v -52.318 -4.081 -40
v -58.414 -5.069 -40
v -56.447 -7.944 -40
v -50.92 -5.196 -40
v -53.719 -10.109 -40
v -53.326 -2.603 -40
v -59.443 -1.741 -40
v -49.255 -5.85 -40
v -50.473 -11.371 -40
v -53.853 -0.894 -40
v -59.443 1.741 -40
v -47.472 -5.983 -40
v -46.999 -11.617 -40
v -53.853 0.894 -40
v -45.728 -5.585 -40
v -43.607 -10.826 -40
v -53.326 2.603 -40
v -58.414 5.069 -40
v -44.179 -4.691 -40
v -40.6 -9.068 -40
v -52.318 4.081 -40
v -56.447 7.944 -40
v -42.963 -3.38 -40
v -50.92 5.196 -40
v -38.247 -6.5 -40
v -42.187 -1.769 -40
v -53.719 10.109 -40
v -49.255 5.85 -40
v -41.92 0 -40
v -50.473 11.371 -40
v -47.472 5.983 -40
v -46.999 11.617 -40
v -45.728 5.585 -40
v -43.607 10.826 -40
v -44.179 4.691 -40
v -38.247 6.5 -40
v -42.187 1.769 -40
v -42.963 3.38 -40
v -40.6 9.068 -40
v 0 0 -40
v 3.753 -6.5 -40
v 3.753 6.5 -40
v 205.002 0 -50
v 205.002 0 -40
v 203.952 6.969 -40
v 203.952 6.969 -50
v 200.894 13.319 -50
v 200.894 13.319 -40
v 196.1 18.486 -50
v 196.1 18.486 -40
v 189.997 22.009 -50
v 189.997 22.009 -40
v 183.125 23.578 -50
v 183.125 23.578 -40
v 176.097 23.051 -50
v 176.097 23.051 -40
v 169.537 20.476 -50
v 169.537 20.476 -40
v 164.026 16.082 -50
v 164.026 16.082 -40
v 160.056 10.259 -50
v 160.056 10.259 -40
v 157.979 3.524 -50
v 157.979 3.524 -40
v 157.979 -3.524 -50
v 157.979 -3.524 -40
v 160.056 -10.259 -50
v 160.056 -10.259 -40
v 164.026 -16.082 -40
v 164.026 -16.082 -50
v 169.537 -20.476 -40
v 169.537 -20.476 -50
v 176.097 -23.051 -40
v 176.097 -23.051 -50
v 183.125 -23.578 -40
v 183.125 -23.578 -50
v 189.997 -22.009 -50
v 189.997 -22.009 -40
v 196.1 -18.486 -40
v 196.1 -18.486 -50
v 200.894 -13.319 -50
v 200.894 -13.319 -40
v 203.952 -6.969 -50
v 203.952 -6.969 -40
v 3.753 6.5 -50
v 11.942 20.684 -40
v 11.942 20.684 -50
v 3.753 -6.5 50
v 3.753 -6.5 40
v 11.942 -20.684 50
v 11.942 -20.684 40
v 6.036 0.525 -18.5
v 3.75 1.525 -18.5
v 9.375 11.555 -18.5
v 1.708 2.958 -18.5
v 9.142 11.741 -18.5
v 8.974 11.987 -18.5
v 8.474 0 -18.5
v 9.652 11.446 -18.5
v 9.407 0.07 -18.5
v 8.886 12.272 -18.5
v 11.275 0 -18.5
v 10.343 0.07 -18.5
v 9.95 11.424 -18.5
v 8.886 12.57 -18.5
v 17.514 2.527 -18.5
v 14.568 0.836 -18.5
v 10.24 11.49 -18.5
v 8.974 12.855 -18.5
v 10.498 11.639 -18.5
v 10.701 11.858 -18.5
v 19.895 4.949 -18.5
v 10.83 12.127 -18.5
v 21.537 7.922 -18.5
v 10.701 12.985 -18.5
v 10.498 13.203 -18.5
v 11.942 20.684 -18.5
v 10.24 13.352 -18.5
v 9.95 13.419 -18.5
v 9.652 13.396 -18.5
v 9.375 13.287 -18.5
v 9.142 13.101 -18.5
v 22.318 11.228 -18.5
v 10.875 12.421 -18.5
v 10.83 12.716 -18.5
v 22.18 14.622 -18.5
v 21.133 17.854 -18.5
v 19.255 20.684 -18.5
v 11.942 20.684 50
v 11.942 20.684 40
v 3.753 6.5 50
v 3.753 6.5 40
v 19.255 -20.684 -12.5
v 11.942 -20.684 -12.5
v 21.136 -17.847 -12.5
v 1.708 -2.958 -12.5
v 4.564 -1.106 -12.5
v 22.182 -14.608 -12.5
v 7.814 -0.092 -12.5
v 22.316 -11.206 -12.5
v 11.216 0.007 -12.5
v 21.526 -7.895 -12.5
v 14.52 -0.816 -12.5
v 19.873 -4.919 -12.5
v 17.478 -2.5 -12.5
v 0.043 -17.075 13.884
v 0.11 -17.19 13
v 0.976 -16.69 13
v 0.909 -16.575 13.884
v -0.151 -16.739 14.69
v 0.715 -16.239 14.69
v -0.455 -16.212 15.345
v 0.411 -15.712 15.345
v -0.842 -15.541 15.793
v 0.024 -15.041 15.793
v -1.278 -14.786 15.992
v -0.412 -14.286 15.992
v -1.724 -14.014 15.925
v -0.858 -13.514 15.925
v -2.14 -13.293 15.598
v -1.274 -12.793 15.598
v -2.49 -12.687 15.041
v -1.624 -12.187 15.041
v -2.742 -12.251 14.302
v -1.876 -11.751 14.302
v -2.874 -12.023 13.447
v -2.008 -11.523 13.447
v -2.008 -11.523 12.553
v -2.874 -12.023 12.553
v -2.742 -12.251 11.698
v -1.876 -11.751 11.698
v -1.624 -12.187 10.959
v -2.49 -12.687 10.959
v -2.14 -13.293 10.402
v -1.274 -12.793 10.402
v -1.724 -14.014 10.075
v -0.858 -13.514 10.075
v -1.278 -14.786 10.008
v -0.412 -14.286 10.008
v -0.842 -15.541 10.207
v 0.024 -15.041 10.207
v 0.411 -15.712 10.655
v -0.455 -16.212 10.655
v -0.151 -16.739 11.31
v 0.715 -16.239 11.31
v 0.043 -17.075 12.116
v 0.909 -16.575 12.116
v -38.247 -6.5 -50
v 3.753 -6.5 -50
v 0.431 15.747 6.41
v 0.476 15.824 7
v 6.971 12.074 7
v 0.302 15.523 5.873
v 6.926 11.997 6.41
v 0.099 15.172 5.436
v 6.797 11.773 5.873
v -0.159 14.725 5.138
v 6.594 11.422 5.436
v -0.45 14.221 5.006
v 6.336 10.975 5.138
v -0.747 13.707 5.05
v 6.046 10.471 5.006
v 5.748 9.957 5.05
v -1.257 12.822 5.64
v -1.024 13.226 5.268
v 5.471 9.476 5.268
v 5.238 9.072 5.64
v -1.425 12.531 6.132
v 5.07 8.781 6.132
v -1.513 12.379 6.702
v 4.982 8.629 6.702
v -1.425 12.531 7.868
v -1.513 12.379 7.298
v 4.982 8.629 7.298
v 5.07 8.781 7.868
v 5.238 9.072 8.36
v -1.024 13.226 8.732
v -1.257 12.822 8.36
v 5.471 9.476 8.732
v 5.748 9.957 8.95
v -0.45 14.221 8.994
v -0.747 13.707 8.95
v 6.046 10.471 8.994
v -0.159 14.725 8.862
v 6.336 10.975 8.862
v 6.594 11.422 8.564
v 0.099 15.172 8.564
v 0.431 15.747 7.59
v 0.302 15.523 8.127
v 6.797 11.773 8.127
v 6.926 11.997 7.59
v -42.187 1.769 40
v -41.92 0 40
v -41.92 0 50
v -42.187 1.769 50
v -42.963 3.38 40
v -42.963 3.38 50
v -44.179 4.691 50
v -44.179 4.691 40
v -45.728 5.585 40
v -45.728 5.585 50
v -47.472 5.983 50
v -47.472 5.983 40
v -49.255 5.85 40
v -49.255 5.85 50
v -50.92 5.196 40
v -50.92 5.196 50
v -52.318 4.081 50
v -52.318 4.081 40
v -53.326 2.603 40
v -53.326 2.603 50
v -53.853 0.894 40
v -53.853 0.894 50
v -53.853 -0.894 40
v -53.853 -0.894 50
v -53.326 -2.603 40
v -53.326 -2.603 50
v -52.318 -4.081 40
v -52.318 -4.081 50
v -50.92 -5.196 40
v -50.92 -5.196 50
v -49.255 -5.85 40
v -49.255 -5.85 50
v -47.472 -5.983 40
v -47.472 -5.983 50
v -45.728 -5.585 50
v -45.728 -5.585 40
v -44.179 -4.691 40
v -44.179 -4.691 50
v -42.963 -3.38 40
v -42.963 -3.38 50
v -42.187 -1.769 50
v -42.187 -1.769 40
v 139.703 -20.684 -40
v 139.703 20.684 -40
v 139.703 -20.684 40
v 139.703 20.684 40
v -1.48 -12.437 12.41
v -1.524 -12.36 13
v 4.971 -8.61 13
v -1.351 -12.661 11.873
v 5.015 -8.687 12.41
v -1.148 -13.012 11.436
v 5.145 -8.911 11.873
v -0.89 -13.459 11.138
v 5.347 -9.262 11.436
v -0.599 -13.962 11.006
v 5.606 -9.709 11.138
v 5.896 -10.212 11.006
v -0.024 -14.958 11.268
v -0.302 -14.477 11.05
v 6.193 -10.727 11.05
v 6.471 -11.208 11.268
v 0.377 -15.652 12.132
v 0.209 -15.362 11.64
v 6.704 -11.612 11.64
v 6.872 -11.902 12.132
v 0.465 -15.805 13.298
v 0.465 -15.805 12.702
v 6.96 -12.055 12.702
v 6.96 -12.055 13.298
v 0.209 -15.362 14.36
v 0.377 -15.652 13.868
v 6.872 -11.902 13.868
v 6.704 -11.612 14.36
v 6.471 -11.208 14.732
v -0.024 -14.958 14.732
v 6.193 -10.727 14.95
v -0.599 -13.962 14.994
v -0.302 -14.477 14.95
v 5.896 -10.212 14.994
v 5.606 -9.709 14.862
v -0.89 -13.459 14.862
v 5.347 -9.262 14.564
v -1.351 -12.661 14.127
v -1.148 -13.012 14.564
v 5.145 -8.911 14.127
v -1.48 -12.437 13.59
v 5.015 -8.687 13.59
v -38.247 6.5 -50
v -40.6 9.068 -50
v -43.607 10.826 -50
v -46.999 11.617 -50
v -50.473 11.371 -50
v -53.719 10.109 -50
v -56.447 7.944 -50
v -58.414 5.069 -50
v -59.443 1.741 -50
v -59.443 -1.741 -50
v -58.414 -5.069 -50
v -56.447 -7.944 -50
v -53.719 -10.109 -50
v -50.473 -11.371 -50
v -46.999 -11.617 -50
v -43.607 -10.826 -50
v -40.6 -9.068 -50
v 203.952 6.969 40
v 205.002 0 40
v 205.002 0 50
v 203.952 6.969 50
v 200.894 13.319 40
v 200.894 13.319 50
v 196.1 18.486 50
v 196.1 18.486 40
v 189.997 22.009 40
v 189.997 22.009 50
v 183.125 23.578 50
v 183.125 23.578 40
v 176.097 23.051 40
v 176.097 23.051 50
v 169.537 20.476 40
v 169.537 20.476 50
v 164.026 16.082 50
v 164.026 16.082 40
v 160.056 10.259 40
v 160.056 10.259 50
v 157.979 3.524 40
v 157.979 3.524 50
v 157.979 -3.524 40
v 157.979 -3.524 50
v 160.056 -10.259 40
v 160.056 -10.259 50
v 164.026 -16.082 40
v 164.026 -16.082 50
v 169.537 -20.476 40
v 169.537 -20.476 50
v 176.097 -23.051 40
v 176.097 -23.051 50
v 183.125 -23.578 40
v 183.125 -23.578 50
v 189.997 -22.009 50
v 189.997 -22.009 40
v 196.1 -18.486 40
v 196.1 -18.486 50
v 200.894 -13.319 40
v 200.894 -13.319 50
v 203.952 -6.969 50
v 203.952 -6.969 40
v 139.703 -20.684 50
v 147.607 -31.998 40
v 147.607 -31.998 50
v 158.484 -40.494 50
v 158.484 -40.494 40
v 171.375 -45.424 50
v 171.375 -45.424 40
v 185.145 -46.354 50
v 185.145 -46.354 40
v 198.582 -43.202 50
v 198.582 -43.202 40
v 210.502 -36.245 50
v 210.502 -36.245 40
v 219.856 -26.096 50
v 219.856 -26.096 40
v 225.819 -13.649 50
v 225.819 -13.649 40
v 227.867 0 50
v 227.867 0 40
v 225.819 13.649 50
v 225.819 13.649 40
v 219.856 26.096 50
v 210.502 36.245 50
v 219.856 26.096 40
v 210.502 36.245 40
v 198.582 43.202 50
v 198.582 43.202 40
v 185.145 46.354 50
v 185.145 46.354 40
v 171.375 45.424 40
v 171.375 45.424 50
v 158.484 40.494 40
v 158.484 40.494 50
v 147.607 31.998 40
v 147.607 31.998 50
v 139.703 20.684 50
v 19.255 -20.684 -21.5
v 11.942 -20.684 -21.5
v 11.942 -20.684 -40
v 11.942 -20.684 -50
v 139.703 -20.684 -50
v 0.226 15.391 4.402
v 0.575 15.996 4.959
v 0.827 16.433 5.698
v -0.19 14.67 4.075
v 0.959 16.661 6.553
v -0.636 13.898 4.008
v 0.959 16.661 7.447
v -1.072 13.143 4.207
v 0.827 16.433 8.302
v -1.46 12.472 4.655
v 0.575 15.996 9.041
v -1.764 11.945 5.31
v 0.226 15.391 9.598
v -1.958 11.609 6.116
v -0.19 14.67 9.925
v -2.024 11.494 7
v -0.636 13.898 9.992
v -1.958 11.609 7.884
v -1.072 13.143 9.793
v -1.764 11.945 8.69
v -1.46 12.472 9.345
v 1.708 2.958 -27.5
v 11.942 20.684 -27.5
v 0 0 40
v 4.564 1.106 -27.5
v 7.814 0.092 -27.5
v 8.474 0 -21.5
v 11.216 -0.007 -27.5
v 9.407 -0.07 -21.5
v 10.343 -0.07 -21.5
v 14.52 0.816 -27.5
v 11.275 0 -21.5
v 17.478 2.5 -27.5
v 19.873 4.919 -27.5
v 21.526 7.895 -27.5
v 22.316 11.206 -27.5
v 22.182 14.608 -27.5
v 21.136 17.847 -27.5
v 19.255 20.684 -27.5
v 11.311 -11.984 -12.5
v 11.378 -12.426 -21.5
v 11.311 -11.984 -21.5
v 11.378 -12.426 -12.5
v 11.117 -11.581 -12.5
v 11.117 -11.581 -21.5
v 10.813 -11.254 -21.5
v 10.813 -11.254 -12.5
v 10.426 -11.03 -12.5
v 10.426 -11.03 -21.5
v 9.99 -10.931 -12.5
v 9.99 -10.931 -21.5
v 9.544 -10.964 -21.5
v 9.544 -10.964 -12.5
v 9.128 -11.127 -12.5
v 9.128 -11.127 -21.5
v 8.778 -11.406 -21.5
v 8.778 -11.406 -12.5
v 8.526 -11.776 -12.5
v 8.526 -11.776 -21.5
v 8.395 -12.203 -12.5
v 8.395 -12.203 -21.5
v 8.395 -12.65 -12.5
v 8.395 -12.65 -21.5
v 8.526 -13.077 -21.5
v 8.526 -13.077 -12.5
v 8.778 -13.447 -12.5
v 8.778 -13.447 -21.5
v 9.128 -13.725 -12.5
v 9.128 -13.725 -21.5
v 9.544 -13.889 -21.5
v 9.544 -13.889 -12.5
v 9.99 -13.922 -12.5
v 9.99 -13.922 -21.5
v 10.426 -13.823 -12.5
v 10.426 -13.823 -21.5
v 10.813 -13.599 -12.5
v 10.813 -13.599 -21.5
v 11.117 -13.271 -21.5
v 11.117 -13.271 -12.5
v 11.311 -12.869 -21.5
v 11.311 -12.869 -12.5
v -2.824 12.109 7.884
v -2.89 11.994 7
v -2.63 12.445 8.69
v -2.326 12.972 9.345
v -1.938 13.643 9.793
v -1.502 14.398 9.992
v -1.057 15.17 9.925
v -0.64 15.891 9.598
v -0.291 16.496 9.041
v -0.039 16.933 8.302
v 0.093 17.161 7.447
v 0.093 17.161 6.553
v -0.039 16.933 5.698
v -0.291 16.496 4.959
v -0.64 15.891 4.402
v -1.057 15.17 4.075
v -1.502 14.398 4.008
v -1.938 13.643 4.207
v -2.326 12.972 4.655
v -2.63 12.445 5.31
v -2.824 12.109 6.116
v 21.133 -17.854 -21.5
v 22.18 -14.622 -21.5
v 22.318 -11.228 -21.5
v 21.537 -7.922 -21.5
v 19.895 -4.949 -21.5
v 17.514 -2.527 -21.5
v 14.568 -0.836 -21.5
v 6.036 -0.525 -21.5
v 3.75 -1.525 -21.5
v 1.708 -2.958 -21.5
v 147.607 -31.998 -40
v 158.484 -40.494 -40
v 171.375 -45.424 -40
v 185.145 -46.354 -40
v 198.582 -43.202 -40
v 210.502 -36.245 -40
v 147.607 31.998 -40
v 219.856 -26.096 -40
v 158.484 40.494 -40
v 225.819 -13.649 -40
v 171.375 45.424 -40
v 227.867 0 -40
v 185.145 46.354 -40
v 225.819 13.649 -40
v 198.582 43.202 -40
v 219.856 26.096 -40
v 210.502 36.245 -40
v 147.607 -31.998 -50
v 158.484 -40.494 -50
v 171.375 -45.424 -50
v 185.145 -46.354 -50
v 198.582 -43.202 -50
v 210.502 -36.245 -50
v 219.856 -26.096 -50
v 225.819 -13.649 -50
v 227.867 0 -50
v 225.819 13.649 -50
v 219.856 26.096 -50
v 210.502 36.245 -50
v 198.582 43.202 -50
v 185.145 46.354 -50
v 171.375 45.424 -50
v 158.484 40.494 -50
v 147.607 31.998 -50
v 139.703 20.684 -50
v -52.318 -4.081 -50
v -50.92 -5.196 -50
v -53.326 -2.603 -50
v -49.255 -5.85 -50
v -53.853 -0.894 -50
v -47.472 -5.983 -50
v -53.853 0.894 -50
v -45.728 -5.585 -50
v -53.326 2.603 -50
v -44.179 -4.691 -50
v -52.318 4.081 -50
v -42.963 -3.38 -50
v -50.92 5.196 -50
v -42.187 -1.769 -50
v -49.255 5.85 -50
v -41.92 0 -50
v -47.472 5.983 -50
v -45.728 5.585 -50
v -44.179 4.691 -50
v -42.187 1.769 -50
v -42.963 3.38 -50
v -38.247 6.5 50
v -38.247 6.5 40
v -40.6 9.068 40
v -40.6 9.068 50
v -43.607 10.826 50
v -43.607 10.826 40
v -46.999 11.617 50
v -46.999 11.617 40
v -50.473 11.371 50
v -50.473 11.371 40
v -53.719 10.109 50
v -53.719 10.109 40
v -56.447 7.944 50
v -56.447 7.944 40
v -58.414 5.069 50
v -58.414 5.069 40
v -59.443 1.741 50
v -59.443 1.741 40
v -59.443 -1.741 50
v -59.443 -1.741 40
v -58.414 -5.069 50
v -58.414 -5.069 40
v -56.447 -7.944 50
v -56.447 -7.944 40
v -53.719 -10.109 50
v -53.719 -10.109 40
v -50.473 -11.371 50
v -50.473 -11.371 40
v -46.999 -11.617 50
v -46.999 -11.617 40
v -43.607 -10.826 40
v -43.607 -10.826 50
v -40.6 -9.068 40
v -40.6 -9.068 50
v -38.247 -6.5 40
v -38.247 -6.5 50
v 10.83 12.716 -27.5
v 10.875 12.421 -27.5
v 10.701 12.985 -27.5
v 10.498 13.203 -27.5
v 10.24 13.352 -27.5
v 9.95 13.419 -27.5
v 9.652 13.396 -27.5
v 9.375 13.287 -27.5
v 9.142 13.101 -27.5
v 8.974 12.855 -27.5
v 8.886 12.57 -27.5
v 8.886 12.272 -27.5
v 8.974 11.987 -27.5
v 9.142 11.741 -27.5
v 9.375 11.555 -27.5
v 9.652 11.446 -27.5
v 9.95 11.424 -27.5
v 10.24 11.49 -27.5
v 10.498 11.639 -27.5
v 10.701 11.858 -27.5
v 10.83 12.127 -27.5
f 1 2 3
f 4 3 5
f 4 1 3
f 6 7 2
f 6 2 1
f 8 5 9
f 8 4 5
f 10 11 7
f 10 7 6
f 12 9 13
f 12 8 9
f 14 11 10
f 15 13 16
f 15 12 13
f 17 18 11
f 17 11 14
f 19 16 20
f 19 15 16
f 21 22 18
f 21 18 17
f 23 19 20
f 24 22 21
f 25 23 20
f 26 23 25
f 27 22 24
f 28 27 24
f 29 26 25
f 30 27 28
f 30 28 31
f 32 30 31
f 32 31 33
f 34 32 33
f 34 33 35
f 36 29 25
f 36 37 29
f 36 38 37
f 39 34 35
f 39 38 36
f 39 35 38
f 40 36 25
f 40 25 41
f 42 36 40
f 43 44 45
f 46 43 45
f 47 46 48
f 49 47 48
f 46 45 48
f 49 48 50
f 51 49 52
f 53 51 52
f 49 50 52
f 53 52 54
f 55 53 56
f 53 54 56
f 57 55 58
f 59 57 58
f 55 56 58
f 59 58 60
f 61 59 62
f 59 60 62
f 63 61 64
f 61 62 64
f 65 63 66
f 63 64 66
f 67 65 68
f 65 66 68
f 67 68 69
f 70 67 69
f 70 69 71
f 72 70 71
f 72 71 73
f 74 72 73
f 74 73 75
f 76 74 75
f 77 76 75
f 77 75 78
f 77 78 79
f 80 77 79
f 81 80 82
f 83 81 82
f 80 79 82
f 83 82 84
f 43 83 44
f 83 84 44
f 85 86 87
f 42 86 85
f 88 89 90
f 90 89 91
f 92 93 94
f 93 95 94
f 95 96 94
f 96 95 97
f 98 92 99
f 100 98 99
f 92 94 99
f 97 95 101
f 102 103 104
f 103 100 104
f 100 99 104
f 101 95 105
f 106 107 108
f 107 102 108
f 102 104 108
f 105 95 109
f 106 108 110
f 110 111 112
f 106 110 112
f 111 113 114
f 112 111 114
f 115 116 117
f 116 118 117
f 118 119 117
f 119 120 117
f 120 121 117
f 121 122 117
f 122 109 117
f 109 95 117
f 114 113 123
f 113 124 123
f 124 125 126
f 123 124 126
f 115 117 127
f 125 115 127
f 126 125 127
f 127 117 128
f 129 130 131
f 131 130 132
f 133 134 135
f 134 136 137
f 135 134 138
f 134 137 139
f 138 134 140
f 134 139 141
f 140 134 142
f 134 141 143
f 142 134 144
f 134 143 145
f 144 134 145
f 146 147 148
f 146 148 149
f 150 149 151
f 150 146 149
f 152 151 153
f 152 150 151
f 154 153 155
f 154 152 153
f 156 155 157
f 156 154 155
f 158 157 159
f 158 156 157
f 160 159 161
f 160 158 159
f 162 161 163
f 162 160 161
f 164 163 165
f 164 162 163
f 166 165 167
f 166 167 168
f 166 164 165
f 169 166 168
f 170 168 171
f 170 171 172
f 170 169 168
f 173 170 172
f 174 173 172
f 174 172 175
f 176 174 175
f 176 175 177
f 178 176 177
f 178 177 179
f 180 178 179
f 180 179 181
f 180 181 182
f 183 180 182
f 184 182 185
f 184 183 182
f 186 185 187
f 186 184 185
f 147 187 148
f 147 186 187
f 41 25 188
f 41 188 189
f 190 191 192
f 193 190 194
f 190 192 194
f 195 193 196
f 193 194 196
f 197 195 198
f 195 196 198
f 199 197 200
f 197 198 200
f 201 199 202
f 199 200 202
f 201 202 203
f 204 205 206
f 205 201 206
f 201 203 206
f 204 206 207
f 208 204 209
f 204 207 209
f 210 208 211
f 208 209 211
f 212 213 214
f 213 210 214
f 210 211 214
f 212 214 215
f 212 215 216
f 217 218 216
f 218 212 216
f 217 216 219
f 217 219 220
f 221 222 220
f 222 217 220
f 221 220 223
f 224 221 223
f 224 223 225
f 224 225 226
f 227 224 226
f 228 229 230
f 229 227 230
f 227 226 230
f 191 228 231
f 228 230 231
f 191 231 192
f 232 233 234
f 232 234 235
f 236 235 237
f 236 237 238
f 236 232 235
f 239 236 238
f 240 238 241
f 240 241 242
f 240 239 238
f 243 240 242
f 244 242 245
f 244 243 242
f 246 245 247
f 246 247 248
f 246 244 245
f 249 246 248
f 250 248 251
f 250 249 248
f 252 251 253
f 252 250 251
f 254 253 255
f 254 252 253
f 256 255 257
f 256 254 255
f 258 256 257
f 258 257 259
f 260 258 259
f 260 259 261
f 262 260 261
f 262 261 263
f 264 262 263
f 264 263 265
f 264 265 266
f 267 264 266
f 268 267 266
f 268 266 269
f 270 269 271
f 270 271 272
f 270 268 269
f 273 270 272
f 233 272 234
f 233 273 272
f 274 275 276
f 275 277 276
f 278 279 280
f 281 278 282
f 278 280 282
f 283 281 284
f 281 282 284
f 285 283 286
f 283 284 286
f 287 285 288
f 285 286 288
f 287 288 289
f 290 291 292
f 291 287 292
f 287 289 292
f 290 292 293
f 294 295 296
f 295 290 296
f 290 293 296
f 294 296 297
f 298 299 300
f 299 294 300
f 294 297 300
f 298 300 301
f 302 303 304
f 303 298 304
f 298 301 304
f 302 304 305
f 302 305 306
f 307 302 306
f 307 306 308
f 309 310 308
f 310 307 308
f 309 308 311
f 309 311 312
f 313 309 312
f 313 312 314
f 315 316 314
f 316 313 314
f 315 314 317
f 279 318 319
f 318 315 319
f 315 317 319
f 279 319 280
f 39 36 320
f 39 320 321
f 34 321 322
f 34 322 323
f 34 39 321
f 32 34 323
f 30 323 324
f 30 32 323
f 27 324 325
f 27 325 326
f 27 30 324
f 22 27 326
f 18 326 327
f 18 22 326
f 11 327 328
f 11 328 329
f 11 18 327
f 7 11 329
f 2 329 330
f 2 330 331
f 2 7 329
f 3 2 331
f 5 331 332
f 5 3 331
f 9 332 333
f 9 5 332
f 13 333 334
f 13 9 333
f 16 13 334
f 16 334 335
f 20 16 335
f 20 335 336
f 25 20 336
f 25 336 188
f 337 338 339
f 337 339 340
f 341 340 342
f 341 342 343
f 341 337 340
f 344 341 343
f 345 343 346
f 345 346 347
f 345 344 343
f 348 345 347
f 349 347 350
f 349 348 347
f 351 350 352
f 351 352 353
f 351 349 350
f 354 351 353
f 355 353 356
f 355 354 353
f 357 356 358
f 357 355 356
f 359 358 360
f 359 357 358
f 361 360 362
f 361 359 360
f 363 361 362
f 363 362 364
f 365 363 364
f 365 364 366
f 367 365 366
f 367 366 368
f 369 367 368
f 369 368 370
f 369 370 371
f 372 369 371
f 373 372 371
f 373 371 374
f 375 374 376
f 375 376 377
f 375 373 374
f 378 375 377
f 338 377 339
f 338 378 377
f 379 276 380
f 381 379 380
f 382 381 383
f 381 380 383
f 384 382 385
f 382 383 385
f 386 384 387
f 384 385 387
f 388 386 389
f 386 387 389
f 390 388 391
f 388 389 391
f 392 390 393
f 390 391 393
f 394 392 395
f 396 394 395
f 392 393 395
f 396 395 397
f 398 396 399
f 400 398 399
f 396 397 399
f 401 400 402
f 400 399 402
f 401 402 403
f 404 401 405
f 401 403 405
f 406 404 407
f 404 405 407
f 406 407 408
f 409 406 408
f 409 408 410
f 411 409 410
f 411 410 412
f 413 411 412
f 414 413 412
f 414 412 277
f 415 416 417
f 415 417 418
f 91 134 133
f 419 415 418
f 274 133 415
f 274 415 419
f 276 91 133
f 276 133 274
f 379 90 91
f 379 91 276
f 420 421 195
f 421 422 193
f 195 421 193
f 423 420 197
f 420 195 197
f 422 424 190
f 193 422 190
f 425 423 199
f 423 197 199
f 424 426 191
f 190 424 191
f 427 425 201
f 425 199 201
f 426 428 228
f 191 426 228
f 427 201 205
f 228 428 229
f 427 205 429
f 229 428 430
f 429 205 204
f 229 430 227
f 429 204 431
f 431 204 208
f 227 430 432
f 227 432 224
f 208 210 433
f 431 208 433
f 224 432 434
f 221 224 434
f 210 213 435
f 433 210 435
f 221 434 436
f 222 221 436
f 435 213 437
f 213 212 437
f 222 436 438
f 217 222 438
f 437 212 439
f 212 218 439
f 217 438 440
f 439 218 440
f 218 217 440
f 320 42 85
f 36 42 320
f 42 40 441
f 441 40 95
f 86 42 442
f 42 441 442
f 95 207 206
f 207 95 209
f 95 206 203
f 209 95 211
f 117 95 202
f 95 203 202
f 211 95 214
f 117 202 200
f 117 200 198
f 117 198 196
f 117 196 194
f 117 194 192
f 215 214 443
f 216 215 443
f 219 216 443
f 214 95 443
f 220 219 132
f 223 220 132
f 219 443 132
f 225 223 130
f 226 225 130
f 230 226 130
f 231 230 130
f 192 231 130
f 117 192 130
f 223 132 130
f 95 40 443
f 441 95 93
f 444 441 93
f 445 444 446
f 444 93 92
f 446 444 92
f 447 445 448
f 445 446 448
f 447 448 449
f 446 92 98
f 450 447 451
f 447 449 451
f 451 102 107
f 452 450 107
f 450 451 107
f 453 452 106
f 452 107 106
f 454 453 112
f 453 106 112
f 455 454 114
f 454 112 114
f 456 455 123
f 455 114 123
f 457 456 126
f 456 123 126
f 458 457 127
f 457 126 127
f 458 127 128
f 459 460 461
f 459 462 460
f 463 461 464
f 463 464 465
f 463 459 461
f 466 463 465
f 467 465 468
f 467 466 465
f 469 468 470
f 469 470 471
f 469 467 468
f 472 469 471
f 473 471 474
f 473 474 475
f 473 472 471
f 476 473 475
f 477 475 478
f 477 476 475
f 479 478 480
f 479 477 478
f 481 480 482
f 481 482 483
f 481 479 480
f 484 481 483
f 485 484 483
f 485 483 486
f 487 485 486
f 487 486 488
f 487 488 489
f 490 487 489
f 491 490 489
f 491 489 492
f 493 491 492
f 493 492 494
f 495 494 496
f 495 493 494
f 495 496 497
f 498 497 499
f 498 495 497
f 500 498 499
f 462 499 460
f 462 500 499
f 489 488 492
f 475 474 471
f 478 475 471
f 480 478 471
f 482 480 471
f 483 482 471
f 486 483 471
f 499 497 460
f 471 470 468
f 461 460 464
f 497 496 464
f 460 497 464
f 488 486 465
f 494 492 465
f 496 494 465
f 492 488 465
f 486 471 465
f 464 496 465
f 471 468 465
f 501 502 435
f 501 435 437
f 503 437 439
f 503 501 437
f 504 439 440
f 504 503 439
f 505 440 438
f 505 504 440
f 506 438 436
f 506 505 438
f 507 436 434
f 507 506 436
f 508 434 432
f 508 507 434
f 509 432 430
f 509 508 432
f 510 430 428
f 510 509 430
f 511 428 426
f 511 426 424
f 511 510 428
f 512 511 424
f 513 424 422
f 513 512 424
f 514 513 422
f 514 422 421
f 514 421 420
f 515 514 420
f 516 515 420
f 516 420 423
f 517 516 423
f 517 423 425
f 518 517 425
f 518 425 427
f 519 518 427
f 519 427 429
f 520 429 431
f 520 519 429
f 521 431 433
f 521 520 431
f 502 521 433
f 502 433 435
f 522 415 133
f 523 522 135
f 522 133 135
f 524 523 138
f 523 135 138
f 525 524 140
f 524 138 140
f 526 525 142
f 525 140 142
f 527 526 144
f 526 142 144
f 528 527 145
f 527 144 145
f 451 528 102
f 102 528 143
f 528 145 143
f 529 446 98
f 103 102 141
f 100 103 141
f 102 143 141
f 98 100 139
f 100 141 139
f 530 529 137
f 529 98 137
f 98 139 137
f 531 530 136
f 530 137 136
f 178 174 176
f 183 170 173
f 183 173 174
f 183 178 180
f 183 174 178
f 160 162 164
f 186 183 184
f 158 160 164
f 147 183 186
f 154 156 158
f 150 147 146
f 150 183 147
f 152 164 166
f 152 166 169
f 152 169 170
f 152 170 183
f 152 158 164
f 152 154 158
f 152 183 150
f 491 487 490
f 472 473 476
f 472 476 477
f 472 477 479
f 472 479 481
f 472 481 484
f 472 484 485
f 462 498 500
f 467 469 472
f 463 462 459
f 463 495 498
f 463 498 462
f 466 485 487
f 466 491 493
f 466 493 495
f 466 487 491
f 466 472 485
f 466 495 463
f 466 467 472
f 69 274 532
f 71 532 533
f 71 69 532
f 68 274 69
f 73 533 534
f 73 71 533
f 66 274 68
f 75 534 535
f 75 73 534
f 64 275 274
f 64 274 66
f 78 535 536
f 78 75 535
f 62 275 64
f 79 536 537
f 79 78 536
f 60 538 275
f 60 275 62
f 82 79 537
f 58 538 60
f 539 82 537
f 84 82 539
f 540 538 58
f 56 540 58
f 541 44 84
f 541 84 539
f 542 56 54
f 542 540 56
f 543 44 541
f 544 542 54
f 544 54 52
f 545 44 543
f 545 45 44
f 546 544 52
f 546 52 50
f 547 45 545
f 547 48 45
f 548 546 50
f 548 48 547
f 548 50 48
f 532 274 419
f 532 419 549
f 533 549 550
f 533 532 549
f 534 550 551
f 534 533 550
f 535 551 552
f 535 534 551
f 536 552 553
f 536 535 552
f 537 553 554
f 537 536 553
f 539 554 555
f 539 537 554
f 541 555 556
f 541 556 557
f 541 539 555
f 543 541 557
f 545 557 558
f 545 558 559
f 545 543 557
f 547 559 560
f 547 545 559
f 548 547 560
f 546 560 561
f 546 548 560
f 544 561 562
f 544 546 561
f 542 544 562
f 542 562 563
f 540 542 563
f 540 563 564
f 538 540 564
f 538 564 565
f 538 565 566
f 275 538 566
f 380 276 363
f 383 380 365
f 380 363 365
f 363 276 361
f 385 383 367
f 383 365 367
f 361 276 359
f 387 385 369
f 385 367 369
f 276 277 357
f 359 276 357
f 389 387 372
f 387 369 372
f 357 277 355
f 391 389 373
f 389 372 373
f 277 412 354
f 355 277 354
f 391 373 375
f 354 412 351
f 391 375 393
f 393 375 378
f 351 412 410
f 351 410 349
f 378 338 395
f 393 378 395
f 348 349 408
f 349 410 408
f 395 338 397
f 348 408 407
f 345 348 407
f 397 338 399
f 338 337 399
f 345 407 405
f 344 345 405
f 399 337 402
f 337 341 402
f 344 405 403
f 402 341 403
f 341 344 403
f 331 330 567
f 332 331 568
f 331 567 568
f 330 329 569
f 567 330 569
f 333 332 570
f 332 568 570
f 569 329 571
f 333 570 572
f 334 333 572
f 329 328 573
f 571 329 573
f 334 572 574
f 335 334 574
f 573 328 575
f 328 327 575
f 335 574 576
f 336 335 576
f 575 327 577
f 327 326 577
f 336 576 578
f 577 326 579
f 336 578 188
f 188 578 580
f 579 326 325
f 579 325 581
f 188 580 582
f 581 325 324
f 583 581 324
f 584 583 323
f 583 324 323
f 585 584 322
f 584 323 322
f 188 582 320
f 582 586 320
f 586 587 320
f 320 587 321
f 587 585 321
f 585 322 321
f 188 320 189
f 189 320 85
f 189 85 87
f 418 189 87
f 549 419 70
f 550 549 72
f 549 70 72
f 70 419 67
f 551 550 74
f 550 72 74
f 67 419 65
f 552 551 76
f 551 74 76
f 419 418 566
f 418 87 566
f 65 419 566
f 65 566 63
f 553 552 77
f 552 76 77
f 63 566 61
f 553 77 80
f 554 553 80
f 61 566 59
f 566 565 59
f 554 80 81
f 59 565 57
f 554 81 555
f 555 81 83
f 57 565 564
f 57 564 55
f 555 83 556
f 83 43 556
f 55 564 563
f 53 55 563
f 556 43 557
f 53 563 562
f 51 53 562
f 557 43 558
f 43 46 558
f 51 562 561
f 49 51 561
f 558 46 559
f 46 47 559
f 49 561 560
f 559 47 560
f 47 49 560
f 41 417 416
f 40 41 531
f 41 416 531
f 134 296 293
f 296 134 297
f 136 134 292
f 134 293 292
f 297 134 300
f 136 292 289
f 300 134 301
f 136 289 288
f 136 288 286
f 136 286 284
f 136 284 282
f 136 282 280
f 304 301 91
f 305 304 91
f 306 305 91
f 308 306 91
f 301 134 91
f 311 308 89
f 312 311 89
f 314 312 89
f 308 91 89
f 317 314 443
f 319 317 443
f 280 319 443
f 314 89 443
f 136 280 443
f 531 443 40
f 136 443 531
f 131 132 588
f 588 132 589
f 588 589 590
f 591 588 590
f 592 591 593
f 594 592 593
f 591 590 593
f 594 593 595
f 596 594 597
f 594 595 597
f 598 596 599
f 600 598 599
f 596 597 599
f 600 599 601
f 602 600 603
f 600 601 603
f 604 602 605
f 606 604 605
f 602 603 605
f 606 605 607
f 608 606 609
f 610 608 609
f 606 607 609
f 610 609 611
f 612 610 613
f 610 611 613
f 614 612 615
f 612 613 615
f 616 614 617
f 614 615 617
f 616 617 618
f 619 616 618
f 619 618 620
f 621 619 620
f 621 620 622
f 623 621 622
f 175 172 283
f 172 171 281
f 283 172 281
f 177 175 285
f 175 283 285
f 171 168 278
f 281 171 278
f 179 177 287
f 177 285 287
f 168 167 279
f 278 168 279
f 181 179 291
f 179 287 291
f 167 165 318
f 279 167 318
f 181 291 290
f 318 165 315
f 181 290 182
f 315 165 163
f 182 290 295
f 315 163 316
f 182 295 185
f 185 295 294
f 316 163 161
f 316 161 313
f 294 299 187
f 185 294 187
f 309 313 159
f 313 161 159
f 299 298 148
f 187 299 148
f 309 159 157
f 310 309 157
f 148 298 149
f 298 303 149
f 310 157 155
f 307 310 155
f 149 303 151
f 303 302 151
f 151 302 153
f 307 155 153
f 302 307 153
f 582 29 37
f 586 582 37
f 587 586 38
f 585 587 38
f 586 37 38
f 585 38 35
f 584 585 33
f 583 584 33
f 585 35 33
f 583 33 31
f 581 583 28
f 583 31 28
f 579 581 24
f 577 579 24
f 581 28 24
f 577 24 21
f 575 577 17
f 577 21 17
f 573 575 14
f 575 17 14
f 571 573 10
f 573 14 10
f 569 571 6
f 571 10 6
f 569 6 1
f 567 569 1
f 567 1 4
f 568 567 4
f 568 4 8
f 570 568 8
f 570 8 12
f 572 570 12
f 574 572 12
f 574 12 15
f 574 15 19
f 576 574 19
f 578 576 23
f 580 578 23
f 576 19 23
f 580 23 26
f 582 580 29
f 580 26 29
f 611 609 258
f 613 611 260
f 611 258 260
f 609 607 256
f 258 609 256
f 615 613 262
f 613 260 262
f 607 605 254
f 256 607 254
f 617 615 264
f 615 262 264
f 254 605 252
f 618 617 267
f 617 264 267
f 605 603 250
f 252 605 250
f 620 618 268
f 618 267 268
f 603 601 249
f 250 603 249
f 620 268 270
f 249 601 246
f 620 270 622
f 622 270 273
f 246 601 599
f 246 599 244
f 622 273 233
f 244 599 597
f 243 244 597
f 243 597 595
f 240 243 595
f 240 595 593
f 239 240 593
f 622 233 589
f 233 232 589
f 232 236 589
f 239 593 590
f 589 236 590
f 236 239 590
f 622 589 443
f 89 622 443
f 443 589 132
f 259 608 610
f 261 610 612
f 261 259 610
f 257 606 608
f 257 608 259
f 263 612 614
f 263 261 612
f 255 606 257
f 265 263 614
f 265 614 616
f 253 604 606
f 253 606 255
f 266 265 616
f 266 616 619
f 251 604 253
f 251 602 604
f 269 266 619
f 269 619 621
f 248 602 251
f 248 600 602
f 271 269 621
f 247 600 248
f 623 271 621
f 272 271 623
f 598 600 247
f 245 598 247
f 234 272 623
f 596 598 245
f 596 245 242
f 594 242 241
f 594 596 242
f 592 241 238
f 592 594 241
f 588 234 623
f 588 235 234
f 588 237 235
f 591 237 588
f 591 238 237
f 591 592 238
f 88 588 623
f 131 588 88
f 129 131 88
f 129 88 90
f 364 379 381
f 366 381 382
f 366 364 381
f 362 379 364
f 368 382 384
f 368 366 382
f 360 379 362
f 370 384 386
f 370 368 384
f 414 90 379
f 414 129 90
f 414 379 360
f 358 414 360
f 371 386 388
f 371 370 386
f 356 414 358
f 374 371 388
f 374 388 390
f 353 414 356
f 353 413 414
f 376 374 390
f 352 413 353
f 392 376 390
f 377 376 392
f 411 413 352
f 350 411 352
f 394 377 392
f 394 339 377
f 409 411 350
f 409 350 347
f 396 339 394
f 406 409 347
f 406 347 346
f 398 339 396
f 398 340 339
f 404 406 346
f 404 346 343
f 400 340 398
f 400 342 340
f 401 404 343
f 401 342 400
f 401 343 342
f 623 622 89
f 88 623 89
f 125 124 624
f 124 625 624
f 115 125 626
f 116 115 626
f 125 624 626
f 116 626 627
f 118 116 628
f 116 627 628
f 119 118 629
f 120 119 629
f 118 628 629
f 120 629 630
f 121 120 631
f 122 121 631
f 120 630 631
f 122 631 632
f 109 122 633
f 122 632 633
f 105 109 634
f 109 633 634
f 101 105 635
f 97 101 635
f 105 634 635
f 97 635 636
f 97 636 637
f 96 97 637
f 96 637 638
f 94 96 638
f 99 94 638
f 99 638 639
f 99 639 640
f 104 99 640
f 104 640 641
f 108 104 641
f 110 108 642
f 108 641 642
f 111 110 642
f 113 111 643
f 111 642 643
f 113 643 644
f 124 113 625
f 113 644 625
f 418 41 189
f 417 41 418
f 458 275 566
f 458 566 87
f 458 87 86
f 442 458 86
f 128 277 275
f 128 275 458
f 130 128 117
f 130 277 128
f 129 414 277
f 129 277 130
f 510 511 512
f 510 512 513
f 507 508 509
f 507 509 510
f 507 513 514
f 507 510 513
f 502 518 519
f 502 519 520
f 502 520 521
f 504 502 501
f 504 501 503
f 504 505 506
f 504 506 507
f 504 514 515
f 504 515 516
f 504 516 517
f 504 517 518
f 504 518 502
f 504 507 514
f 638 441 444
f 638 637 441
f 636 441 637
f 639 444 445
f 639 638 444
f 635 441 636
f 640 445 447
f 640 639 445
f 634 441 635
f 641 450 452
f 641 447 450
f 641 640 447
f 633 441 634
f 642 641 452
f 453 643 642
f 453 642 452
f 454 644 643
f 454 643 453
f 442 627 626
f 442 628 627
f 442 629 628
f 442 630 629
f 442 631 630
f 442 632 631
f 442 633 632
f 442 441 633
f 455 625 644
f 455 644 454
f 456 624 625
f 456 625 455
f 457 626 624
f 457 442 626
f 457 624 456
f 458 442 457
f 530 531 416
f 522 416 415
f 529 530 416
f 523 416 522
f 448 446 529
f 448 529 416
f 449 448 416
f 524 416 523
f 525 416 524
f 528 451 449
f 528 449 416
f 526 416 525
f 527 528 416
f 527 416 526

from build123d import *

# Parameters (mm, degrees)
BOSS_EXTRUDE4_DEPTH  = 40
SKETCH4_R            = 6
SKETCH4_R_2          = 23.64386934
BOSS_EXTRUDE5_DEPTH  = 10
SKETCH19_R           = 12.5
SKETCH19_R_2         = 1
CUT_EXTRUDE2_DEPTH   = 4.5
SKETCH21_R           = 2
BOSS_EXTRUDE7_DEPTH  = 8.5
SKETCH24_R           = 2
BOSS_EXTRUDE8_DEPTH  = 8.5
SKETCH26_R           = 12.5
CUT_EXTRUDE3_DEPTH   = 4.5
SKETCH32_R           = 1.5
BOSS_EXTRUDE10_DEPTH = 4.5
SKETCH33_R           = 3
BOSS_EXTRUDE11_DEPTH = 1
SKETCH34_R           = 3
BOSS_EXTRUDE12_DEPTH = 1


with BuildPart() as part:
    # Sketch1 → Boss-Extrude4 (new body)
    with BuildSketch(Plane.XY):
        Polygon((0, 0), (11.941837529, 20.683869337), (139.702763908, 20.683869337), (139.702763908, -20.683869337), (11.941837529, -20.683869337), align=None)
    extrude(amount=BOSS_EXTRUDE4_DEPTH)

    # Sketch4 → Boss-Extrude5 (add)
    with BuildSketch(Plane.XY.offset(40)):
        with BuildLine():
            Line((139.702763908, 20.683869337), (11.941837529, 20.683869337))
            Line((11.941837529, 20.683869337), (3.75277675, 6.5))
            Line((3.75277675, 6.5), (-38.24722325, 6.5))
            ThreePointArc((-38.24722325, 6.5), (-59.57399913, 0), (-38.24722325, -6.5))
            Line((-38.24722325, -6.5), (3.75277675, -6.5))
            Line((3.75277675, -6.5), (11.941837529, -20.683869337))
            Line((11.941837529, -20.683869337), (139.702763908, -20.683869337))
            ThreePointArc((139.702763908, -20.683869337), (227.866884071, 0), (139.702763908, 20.683869337))
        make_face()
        with Locations((-47.920072343, 0)):
            Circle(SKETCH4_R, mode=Mode.SUBTRACT)
        with Locations((181.358539635, 0)):
            Circle(SKETCH4_R_2, mode=Mode.SUBTRACT)
    extrude(amount=BOSS_EXTRUDE5_DEPTH)

    # Mirror2: part across plane


with BuildPart() as part_1:
    add(part.part)
    add(part.part.mirror(Plane.XY))

    # Sketch19 → Cut-Extrude2 (cut, symmetric)
    with BuildSketch(Plane.XY.offset(-23)):
        with Locations((9.87490508, 12.421300452)):
            Circle(SKETCH19_R)
        with Locations((9.87490508, 12.421300452)):
            Circle(SKETCH19_R_2, mode=Mode.SUBTRACT)
    extrude(amount=CUT_EXTRUDE2_DEPTH, both=True, mode=Mode.SUBTRACT)

    # Sketch21 → Boss-Extrude7 (add)
    with BuildSketch(Plane(origin=(0, 0, 0), x_dir=(0, 0, 1), z_dir=(-0.8660254037844399, 0.4999999999999979, 0))):
        with Locations(Location((7, 11.941837529, 0), (0, 0, 90))):
            Circle(SKETCH21_R)
    extrude(amount=BOSS_EXTRUDE7_DEPTH)

    # Sketch24 → Boss-Extrude8 (add)
    with BuildSketch(Plane(origin=(0, 0, 0), x_dir=(0, 0, 1), z_dir=(-0.8660254037844399, -0.49999999999999784, 0))):
        with Locations(Location((13, -11.941837529, 0), (0, 0, 90))):
            Circle(SKETCH24_R)
    extrude(amount=BOSS_EXTRUDE8_DEPTH)

    # Sketch26 → Cut-Extrude3 (cut, symmetric)
    with BuildSketch(Plane.XY.offset(-17)):
        with Locations((9.87490508, -12.421300452)):
            Circle(SKETCH26_R)
    extrude(amount=CUT_EXTRUDE3_DEPTH, both=True, mode=Mode.SUBTRACT)

    # Sketch33 → Boss-Extrude11 (add)
    with BuildSketch(Plane(origin=(-7.361215932, 4.25, 0), x_dir=(0, 0, 1), z_dir=(-0.8660254037844399, 0.49999999999999795, 0))):
        with Locations(Location((7, 11.941837529, 0), (0, 0, 270))):
            Circle(SKETCH33_R)
    extrude(amount=-BOSS_EXTRUDE11_DEPTH)

    # Sketch34 → Boss-Extrude12 (add)
    with BuildSketch(Plane(origin=(-7.361215932, -4.25, 0), x_dir=(0, 0, 1), z_dir=(-0.8660254037844399, -0.49999999999999784, 0))):
        with Locations(Location((13, -11.941837529, 0), (0, 0, 270))):
            Circle(SKETCH34_R)
    extrude(amount=-BOSS_EXTRUDE12_DEPTH)


with BuildPart() as body_2:
    # Sketch32 → Boss-Extrude10 (new, symmetric)
    with BuildSketch(Plane.XY.offset(-17)):
        with Locations((9.877833455, -12.426372546)):
            Circle(SKETCH32_R)
    extrude(amount=BOSS_EXTRUDE10_DEPTH, both=True)


solid = Compound([part_1.part, body_2.part])
